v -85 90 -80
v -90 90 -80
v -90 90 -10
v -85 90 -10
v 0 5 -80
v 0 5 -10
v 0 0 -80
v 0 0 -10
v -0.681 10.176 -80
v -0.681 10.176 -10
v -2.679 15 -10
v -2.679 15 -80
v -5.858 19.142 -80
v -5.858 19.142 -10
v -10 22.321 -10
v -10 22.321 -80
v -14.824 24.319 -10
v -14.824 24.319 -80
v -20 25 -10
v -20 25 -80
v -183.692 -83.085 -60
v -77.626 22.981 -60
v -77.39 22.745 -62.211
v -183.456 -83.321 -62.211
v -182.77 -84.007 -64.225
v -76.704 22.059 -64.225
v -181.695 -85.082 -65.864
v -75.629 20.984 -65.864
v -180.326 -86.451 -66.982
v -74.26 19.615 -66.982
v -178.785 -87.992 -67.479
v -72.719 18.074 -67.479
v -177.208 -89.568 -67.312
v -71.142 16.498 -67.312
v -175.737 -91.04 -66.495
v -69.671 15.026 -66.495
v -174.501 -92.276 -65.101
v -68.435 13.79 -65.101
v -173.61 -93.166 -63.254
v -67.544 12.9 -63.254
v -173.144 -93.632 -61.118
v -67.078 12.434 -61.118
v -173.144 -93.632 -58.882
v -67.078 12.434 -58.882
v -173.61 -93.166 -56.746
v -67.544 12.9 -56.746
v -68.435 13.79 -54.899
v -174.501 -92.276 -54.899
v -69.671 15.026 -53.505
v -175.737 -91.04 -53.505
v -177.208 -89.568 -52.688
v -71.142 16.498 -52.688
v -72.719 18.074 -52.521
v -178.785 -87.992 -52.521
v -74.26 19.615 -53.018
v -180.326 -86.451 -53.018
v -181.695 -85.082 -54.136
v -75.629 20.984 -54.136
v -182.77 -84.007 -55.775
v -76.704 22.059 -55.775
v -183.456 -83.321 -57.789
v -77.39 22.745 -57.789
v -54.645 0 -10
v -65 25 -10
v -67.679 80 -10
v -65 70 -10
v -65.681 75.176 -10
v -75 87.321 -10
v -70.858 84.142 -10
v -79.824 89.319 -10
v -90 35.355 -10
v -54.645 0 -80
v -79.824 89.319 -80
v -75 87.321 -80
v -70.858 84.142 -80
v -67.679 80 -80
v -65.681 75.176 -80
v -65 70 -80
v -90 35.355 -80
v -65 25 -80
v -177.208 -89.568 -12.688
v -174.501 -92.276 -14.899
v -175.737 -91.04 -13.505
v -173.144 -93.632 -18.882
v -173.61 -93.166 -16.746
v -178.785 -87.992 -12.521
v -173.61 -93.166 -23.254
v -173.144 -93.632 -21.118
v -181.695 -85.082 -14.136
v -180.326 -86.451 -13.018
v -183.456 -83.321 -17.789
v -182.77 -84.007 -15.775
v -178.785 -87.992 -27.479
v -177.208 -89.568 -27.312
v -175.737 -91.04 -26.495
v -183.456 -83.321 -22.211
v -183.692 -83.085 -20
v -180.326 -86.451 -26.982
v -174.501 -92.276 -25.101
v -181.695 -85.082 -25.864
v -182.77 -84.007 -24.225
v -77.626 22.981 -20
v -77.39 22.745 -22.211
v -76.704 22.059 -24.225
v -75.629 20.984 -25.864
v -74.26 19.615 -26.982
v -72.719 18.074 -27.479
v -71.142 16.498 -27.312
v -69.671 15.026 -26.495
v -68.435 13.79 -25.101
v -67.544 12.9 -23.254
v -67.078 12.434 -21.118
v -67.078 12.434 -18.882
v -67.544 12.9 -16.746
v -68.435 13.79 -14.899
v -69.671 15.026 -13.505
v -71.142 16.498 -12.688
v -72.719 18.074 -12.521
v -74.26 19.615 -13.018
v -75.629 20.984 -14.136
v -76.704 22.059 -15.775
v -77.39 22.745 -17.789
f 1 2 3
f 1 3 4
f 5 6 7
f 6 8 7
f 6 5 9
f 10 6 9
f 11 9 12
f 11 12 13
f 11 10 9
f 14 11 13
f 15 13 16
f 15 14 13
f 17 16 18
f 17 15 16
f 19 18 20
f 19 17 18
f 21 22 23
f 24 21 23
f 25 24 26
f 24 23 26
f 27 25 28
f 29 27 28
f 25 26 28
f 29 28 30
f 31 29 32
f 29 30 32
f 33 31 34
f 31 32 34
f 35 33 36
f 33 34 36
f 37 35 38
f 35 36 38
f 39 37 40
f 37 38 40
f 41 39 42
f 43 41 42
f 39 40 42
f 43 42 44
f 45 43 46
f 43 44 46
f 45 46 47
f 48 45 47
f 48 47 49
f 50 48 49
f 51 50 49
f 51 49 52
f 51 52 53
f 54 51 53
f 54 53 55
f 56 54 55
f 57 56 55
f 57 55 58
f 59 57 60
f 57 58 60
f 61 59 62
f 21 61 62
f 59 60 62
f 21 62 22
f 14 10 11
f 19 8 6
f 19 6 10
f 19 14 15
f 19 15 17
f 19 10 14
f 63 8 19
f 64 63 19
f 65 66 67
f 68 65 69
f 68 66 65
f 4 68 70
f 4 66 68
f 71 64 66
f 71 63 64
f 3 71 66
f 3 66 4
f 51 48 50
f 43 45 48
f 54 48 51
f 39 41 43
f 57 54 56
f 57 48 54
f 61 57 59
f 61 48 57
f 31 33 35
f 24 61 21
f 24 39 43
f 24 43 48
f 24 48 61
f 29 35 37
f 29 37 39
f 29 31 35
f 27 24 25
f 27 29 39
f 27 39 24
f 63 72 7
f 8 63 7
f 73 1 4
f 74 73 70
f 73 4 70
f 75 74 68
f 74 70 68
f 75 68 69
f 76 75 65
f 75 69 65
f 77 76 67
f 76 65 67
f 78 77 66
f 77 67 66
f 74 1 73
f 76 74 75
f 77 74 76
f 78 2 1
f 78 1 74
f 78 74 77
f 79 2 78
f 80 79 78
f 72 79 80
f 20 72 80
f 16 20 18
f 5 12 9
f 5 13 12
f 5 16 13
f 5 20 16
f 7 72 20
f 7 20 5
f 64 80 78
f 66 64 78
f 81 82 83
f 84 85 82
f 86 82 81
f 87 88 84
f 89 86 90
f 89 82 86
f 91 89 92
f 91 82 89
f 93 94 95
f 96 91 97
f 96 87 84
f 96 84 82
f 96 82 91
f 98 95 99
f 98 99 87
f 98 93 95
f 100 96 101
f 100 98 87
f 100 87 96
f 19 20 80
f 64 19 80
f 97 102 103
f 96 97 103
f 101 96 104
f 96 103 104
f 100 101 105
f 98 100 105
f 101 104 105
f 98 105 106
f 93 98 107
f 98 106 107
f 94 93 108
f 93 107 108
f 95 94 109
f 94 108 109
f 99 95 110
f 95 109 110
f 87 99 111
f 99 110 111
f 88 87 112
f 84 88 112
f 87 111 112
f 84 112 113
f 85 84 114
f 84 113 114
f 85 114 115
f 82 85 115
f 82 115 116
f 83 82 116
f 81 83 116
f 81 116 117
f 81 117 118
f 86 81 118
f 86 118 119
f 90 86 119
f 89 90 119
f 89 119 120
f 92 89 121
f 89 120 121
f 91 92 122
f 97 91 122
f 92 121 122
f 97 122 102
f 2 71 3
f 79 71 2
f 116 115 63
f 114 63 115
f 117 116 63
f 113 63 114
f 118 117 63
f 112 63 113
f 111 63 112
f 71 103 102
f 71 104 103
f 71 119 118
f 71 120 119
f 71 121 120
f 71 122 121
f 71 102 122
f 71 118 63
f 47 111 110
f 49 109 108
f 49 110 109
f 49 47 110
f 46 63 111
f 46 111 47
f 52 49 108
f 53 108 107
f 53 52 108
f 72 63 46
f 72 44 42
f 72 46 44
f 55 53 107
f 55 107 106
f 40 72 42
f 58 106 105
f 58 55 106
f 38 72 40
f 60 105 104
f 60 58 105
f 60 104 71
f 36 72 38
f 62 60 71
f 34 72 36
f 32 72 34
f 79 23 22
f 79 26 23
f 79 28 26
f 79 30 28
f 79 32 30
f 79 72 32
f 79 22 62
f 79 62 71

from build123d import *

# Parameters (mm, degrees)
SKETCH1_W           = 90
SKETCH1_H           = 80
BOSS_EXTRUDE1_DEPTH = 90
SKETCH2_W           = 65
SKETCH2_H           = 65
CUT_EXTRUDE1_DEPTH  = 100
FILLET1_R           = 20
CUT_EXTRUDE2_DEPTH  = 100
SKETCH4_R           = 7.5
BOSS_EXTRUDE2_DEPTH = 150
SKETCH6_W           = 10
SKETCH6_H           = 127.279220614
CUT_EXTRUDE4_DEPTH  = 212.224744882


with BuildPart() as part:
    # Sketch1 → Boss-Extrude1 (new body)
    with BuildSketch(Plane(origin=(0, 0, 0), x_dir=(1, 0, 0), z_dir=(0, 1, 0))):
        with Locations((-45, 40)):
            Rectangle(SKETCH1_W, SKETCH1_H)
    extrude(amount=BOSS_EXTRUDE1_DEPTH)

    # Sketch2 → Cut-Extrude1 (cut)
    with BuildSketch(Plane(origin=(0, 0, -80), x_dir=(-1, 0, 0), z_dir=(0, 0, -1))):
        with Locations((32.5, 57.5)):
            Rectangle(SKETCH2_W, SKETCH2_H)
    extrude(amount=-CUT_EXTRUDE1_DEPTH, mode=Mode.SUBTRACT)

    # Fillet1
    fillet1_edges = [part.edges().sort_by_distance(p)[0] for p in [
        (-65, 90, -40),
        (0, 25, -40),
    ]]
    fillet(fillet1_edges, radius=FILLET1_R)

    # Sketch3 → Cut-Extrude2 (cut)
    with BuildSketch(Plane(origin=(0, 0, -80), x_dir=(-1, 0, 0), z_dir=(0, 0, -1))):
        Polygon((54.644660941, 0), (90, 35.355339059), (90, 0), align=None)
    extrude(amount=-CUT_EXTRUDE2_DEPTH, mode=Mode.SUBTRACT)

    # Sketch4 → Boss-Extrude2 (add)
    with BuildSketch(Plane(origin=(-27.32233047, -27.32233047, 0), x_dir=(0, 0, 1), z_dir=(-0.7071067811865477, -0.7071067811865475, 0))):
        with Locations(Location((-60, 63.639610307, 0), (0, 0, 90))):
            Circle(SKETCH4_R)
        with Locations(Location((-20, 63.639610307, 0), (0, 0, 90))):
            Circle(SKETCH4_R)
    extrude(amount=BOSS_EXTRUDE2_DEPTH)

    # Sketch6 → Cut-Extrude4 (cut, through all)
    with BuildSketch(Plane(origin=(-27.32233047, -27.32233047, 0), x_dir=(0, 0, 1), z_dir=(-0.7071067811865477, -0.7071067811865475, 0))):
        with Locations((-5, 63.639610307)):
            Rectangle(SKETCH6_W, SKETCH6_H)
    extrude(amount=-CUT_EXTRUDE4_DEPTH, mode=Mode.SUBTRACT)


solid = part.part
